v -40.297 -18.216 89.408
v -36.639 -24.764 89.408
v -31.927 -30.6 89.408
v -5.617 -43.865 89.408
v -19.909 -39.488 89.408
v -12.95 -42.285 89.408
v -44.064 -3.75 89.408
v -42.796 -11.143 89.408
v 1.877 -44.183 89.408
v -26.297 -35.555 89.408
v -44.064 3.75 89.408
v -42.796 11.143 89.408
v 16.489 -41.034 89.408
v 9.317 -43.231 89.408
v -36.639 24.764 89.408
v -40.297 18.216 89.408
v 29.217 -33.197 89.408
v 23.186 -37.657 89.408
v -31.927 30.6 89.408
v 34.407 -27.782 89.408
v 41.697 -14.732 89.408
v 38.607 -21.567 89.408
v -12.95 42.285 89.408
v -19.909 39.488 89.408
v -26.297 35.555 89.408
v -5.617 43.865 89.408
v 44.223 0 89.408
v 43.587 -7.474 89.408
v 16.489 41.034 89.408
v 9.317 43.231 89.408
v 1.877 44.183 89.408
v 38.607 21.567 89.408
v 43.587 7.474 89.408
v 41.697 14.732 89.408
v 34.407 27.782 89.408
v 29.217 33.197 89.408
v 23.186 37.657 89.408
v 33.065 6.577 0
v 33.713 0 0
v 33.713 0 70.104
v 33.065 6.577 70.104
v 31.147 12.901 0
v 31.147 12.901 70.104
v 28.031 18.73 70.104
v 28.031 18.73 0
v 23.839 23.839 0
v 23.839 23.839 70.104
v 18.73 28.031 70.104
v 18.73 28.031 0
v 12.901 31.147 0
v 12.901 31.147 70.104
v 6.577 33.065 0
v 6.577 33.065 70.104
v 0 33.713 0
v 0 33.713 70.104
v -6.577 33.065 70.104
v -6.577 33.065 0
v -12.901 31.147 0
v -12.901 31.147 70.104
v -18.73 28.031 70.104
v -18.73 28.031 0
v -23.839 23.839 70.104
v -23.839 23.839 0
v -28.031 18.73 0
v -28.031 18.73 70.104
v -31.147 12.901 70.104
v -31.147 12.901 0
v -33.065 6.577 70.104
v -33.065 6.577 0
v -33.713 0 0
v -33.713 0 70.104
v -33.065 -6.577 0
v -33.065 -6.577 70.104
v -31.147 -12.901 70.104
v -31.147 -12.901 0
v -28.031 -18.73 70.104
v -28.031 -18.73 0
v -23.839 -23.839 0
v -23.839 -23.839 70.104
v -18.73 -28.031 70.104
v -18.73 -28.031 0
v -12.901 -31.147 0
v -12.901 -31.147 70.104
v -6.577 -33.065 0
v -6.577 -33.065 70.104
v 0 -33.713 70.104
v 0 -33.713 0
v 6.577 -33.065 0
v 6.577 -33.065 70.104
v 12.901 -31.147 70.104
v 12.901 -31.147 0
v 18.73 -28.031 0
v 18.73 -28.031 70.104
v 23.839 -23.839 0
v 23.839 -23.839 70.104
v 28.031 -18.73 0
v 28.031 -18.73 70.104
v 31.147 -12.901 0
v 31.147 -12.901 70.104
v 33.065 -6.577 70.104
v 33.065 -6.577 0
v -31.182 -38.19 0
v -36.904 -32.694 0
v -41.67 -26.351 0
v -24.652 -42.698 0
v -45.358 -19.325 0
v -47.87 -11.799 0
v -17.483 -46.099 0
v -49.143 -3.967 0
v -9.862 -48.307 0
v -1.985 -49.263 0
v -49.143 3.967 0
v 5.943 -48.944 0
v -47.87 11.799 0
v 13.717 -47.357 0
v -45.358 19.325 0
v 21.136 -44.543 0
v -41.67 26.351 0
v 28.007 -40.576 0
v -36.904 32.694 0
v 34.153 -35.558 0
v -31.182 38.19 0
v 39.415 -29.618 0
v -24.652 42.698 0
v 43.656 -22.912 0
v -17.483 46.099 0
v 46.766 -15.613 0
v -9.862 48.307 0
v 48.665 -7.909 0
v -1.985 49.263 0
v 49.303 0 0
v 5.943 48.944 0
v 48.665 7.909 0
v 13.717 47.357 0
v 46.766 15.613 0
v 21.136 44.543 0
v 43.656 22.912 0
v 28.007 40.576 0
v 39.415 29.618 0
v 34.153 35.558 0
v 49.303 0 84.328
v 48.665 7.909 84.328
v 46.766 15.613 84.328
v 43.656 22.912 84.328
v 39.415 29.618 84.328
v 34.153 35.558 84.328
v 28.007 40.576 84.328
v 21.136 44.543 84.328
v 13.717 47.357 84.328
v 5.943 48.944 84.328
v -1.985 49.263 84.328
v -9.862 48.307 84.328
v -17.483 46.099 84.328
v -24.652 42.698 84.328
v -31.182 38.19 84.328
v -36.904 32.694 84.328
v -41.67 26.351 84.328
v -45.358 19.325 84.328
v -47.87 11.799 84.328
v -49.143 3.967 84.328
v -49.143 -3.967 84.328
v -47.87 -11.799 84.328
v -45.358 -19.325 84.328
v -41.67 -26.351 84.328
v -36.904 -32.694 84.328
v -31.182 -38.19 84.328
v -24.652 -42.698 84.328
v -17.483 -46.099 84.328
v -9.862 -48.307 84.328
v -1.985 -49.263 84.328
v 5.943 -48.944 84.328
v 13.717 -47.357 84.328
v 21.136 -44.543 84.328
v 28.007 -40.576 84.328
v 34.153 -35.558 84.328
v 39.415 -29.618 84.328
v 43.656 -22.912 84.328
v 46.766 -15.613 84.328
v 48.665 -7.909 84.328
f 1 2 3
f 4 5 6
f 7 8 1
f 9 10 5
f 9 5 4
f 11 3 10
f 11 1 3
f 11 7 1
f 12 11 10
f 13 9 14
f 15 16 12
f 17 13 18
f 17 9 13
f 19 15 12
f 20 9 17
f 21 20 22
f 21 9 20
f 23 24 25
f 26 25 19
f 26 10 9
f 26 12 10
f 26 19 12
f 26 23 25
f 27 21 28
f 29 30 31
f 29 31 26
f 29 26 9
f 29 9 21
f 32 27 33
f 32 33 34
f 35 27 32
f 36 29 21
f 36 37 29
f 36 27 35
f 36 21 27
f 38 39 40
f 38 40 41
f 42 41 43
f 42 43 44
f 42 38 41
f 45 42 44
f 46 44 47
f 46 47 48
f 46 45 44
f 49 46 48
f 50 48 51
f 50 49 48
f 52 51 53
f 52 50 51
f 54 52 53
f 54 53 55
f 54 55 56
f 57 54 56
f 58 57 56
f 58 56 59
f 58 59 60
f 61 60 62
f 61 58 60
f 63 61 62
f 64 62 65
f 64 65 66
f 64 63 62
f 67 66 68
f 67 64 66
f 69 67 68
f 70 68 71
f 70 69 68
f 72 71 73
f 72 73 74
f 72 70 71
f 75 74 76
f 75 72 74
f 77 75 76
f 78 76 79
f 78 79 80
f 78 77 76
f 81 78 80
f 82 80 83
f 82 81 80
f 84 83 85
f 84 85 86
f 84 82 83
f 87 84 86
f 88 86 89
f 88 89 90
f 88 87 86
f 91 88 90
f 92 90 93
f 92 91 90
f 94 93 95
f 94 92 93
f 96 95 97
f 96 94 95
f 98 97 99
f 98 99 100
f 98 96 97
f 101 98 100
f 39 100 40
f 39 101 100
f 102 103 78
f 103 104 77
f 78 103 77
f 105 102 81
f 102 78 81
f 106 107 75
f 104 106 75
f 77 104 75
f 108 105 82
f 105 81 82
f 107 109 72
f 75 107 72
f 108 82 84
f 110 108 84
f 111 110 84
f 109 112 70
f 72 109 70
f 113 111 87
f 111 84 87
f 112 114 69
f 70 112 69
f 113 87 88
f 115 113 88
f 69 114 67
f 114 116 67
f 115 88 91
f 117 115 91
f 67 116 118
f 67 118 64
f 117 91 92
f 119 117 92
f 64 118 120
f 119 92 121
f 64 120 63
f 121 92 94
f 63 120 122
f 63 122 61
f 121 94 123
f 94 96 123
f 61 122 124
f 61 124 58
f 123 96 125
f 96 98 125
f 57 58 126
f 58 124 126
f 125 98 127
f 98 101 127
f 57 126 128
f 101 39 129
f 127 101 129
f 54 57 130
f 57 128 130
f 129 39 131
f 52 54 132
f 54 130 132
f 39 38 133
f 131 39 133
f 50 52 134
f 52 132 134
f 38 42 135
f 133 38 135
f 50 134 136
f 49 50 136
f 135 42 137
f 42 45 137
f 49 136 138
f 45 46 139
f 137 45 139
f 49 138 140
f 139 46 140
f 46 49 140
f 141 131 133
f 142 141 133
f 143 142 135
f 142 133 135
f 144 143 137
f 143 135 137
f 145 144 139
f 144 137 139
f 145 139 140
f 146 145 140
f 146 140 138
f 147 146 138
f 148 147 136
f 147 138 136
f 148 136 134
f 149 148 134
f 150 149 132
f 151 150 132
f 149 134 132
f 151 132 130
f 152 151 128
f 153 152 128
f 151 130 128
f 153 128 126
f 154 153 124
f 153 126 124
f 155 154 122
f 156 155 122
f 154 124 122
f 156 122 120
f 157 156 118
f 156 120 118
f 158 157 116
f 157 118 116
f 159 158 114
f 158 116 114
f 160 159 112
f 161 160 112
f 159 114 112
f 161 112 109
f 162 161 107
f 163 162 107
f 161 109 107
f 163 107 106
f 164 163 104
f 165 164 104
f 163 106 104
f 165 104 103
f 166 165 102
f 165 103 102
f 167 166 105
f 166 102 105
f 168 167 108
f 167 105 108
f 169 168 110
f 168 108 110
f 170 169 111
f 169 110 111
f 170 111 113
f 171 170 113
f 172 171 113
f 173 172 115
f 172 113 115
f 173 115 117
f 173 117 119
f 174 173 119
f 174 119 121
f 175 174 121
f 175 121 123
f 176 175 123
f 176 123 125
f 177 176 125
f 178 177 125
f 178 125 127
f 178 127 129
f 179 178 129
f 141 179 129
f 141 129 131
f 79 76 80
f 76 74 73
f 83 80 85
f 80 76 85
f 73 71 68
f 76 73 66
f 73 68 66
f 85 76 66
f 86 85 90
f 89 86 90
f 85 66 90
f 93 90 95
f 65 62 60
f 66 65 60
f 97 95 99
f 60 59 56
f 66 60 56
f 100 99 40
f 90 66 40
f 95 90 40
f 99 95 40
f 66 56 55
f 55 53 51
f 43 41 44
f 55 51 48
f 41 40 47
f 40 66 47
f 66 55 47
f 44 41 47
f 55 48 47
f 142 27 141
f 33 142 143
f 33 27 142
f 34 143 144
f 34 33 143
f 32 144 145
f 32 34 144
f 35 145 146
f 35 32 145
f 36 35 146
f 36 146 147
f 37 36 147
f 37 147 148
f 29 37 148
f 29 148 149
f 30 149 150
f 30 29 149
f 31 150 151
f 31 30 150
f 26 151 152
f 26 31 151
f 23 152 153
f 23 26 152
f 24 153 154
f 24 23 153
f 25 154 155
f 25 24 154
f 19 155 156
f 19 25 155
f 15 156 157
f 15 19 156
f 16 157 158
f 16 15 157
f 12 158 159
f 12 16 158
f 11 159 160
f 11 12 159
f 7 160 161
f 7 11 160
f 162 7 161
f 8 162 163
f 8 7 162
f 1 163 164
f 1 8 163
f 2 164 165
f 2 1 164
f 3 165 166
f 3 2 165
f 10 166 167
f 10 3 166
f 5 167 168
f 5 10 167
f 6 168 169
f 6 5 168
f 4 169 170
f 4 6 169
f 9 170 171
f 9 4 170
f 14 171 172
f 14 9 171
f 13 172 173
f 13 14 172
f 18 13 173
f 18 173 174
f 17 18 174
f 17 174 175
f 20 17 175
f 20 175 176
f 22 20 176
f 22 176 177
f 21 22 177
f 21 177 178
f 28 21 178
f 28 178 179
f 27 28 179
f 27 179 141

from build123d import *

# Parameters (mm, degrees)
F0_R     = 49.303083
F1_DEPTH = 89.408
F2_SIZE  = 5.08
F3_R     = 33.713024
F4_DEPTH = 70.104


with BuildPart() as f1:
    # F0 (on Top) → F1 (new body)
    with BuildSketch(Plane.XY):
        Circle(F0_R)
    extrude(amount=F1_DEPTH)

    # F2
    f2_edges = [f1.edges().sort_by_distance(p)[0] for p in [
        (-49.303083, 0, 89.408),
    ]]
    chamfer(f2_edges, length=F2_SIZE)

    # F3 (on Top) → F4 (cut)
    with BuildSketch(Plane.XY):
        Circle(F3_R)
    extrude(amount=F4_DEPTH, mode=Mode.SUBTRACT)


solid = f1.part
